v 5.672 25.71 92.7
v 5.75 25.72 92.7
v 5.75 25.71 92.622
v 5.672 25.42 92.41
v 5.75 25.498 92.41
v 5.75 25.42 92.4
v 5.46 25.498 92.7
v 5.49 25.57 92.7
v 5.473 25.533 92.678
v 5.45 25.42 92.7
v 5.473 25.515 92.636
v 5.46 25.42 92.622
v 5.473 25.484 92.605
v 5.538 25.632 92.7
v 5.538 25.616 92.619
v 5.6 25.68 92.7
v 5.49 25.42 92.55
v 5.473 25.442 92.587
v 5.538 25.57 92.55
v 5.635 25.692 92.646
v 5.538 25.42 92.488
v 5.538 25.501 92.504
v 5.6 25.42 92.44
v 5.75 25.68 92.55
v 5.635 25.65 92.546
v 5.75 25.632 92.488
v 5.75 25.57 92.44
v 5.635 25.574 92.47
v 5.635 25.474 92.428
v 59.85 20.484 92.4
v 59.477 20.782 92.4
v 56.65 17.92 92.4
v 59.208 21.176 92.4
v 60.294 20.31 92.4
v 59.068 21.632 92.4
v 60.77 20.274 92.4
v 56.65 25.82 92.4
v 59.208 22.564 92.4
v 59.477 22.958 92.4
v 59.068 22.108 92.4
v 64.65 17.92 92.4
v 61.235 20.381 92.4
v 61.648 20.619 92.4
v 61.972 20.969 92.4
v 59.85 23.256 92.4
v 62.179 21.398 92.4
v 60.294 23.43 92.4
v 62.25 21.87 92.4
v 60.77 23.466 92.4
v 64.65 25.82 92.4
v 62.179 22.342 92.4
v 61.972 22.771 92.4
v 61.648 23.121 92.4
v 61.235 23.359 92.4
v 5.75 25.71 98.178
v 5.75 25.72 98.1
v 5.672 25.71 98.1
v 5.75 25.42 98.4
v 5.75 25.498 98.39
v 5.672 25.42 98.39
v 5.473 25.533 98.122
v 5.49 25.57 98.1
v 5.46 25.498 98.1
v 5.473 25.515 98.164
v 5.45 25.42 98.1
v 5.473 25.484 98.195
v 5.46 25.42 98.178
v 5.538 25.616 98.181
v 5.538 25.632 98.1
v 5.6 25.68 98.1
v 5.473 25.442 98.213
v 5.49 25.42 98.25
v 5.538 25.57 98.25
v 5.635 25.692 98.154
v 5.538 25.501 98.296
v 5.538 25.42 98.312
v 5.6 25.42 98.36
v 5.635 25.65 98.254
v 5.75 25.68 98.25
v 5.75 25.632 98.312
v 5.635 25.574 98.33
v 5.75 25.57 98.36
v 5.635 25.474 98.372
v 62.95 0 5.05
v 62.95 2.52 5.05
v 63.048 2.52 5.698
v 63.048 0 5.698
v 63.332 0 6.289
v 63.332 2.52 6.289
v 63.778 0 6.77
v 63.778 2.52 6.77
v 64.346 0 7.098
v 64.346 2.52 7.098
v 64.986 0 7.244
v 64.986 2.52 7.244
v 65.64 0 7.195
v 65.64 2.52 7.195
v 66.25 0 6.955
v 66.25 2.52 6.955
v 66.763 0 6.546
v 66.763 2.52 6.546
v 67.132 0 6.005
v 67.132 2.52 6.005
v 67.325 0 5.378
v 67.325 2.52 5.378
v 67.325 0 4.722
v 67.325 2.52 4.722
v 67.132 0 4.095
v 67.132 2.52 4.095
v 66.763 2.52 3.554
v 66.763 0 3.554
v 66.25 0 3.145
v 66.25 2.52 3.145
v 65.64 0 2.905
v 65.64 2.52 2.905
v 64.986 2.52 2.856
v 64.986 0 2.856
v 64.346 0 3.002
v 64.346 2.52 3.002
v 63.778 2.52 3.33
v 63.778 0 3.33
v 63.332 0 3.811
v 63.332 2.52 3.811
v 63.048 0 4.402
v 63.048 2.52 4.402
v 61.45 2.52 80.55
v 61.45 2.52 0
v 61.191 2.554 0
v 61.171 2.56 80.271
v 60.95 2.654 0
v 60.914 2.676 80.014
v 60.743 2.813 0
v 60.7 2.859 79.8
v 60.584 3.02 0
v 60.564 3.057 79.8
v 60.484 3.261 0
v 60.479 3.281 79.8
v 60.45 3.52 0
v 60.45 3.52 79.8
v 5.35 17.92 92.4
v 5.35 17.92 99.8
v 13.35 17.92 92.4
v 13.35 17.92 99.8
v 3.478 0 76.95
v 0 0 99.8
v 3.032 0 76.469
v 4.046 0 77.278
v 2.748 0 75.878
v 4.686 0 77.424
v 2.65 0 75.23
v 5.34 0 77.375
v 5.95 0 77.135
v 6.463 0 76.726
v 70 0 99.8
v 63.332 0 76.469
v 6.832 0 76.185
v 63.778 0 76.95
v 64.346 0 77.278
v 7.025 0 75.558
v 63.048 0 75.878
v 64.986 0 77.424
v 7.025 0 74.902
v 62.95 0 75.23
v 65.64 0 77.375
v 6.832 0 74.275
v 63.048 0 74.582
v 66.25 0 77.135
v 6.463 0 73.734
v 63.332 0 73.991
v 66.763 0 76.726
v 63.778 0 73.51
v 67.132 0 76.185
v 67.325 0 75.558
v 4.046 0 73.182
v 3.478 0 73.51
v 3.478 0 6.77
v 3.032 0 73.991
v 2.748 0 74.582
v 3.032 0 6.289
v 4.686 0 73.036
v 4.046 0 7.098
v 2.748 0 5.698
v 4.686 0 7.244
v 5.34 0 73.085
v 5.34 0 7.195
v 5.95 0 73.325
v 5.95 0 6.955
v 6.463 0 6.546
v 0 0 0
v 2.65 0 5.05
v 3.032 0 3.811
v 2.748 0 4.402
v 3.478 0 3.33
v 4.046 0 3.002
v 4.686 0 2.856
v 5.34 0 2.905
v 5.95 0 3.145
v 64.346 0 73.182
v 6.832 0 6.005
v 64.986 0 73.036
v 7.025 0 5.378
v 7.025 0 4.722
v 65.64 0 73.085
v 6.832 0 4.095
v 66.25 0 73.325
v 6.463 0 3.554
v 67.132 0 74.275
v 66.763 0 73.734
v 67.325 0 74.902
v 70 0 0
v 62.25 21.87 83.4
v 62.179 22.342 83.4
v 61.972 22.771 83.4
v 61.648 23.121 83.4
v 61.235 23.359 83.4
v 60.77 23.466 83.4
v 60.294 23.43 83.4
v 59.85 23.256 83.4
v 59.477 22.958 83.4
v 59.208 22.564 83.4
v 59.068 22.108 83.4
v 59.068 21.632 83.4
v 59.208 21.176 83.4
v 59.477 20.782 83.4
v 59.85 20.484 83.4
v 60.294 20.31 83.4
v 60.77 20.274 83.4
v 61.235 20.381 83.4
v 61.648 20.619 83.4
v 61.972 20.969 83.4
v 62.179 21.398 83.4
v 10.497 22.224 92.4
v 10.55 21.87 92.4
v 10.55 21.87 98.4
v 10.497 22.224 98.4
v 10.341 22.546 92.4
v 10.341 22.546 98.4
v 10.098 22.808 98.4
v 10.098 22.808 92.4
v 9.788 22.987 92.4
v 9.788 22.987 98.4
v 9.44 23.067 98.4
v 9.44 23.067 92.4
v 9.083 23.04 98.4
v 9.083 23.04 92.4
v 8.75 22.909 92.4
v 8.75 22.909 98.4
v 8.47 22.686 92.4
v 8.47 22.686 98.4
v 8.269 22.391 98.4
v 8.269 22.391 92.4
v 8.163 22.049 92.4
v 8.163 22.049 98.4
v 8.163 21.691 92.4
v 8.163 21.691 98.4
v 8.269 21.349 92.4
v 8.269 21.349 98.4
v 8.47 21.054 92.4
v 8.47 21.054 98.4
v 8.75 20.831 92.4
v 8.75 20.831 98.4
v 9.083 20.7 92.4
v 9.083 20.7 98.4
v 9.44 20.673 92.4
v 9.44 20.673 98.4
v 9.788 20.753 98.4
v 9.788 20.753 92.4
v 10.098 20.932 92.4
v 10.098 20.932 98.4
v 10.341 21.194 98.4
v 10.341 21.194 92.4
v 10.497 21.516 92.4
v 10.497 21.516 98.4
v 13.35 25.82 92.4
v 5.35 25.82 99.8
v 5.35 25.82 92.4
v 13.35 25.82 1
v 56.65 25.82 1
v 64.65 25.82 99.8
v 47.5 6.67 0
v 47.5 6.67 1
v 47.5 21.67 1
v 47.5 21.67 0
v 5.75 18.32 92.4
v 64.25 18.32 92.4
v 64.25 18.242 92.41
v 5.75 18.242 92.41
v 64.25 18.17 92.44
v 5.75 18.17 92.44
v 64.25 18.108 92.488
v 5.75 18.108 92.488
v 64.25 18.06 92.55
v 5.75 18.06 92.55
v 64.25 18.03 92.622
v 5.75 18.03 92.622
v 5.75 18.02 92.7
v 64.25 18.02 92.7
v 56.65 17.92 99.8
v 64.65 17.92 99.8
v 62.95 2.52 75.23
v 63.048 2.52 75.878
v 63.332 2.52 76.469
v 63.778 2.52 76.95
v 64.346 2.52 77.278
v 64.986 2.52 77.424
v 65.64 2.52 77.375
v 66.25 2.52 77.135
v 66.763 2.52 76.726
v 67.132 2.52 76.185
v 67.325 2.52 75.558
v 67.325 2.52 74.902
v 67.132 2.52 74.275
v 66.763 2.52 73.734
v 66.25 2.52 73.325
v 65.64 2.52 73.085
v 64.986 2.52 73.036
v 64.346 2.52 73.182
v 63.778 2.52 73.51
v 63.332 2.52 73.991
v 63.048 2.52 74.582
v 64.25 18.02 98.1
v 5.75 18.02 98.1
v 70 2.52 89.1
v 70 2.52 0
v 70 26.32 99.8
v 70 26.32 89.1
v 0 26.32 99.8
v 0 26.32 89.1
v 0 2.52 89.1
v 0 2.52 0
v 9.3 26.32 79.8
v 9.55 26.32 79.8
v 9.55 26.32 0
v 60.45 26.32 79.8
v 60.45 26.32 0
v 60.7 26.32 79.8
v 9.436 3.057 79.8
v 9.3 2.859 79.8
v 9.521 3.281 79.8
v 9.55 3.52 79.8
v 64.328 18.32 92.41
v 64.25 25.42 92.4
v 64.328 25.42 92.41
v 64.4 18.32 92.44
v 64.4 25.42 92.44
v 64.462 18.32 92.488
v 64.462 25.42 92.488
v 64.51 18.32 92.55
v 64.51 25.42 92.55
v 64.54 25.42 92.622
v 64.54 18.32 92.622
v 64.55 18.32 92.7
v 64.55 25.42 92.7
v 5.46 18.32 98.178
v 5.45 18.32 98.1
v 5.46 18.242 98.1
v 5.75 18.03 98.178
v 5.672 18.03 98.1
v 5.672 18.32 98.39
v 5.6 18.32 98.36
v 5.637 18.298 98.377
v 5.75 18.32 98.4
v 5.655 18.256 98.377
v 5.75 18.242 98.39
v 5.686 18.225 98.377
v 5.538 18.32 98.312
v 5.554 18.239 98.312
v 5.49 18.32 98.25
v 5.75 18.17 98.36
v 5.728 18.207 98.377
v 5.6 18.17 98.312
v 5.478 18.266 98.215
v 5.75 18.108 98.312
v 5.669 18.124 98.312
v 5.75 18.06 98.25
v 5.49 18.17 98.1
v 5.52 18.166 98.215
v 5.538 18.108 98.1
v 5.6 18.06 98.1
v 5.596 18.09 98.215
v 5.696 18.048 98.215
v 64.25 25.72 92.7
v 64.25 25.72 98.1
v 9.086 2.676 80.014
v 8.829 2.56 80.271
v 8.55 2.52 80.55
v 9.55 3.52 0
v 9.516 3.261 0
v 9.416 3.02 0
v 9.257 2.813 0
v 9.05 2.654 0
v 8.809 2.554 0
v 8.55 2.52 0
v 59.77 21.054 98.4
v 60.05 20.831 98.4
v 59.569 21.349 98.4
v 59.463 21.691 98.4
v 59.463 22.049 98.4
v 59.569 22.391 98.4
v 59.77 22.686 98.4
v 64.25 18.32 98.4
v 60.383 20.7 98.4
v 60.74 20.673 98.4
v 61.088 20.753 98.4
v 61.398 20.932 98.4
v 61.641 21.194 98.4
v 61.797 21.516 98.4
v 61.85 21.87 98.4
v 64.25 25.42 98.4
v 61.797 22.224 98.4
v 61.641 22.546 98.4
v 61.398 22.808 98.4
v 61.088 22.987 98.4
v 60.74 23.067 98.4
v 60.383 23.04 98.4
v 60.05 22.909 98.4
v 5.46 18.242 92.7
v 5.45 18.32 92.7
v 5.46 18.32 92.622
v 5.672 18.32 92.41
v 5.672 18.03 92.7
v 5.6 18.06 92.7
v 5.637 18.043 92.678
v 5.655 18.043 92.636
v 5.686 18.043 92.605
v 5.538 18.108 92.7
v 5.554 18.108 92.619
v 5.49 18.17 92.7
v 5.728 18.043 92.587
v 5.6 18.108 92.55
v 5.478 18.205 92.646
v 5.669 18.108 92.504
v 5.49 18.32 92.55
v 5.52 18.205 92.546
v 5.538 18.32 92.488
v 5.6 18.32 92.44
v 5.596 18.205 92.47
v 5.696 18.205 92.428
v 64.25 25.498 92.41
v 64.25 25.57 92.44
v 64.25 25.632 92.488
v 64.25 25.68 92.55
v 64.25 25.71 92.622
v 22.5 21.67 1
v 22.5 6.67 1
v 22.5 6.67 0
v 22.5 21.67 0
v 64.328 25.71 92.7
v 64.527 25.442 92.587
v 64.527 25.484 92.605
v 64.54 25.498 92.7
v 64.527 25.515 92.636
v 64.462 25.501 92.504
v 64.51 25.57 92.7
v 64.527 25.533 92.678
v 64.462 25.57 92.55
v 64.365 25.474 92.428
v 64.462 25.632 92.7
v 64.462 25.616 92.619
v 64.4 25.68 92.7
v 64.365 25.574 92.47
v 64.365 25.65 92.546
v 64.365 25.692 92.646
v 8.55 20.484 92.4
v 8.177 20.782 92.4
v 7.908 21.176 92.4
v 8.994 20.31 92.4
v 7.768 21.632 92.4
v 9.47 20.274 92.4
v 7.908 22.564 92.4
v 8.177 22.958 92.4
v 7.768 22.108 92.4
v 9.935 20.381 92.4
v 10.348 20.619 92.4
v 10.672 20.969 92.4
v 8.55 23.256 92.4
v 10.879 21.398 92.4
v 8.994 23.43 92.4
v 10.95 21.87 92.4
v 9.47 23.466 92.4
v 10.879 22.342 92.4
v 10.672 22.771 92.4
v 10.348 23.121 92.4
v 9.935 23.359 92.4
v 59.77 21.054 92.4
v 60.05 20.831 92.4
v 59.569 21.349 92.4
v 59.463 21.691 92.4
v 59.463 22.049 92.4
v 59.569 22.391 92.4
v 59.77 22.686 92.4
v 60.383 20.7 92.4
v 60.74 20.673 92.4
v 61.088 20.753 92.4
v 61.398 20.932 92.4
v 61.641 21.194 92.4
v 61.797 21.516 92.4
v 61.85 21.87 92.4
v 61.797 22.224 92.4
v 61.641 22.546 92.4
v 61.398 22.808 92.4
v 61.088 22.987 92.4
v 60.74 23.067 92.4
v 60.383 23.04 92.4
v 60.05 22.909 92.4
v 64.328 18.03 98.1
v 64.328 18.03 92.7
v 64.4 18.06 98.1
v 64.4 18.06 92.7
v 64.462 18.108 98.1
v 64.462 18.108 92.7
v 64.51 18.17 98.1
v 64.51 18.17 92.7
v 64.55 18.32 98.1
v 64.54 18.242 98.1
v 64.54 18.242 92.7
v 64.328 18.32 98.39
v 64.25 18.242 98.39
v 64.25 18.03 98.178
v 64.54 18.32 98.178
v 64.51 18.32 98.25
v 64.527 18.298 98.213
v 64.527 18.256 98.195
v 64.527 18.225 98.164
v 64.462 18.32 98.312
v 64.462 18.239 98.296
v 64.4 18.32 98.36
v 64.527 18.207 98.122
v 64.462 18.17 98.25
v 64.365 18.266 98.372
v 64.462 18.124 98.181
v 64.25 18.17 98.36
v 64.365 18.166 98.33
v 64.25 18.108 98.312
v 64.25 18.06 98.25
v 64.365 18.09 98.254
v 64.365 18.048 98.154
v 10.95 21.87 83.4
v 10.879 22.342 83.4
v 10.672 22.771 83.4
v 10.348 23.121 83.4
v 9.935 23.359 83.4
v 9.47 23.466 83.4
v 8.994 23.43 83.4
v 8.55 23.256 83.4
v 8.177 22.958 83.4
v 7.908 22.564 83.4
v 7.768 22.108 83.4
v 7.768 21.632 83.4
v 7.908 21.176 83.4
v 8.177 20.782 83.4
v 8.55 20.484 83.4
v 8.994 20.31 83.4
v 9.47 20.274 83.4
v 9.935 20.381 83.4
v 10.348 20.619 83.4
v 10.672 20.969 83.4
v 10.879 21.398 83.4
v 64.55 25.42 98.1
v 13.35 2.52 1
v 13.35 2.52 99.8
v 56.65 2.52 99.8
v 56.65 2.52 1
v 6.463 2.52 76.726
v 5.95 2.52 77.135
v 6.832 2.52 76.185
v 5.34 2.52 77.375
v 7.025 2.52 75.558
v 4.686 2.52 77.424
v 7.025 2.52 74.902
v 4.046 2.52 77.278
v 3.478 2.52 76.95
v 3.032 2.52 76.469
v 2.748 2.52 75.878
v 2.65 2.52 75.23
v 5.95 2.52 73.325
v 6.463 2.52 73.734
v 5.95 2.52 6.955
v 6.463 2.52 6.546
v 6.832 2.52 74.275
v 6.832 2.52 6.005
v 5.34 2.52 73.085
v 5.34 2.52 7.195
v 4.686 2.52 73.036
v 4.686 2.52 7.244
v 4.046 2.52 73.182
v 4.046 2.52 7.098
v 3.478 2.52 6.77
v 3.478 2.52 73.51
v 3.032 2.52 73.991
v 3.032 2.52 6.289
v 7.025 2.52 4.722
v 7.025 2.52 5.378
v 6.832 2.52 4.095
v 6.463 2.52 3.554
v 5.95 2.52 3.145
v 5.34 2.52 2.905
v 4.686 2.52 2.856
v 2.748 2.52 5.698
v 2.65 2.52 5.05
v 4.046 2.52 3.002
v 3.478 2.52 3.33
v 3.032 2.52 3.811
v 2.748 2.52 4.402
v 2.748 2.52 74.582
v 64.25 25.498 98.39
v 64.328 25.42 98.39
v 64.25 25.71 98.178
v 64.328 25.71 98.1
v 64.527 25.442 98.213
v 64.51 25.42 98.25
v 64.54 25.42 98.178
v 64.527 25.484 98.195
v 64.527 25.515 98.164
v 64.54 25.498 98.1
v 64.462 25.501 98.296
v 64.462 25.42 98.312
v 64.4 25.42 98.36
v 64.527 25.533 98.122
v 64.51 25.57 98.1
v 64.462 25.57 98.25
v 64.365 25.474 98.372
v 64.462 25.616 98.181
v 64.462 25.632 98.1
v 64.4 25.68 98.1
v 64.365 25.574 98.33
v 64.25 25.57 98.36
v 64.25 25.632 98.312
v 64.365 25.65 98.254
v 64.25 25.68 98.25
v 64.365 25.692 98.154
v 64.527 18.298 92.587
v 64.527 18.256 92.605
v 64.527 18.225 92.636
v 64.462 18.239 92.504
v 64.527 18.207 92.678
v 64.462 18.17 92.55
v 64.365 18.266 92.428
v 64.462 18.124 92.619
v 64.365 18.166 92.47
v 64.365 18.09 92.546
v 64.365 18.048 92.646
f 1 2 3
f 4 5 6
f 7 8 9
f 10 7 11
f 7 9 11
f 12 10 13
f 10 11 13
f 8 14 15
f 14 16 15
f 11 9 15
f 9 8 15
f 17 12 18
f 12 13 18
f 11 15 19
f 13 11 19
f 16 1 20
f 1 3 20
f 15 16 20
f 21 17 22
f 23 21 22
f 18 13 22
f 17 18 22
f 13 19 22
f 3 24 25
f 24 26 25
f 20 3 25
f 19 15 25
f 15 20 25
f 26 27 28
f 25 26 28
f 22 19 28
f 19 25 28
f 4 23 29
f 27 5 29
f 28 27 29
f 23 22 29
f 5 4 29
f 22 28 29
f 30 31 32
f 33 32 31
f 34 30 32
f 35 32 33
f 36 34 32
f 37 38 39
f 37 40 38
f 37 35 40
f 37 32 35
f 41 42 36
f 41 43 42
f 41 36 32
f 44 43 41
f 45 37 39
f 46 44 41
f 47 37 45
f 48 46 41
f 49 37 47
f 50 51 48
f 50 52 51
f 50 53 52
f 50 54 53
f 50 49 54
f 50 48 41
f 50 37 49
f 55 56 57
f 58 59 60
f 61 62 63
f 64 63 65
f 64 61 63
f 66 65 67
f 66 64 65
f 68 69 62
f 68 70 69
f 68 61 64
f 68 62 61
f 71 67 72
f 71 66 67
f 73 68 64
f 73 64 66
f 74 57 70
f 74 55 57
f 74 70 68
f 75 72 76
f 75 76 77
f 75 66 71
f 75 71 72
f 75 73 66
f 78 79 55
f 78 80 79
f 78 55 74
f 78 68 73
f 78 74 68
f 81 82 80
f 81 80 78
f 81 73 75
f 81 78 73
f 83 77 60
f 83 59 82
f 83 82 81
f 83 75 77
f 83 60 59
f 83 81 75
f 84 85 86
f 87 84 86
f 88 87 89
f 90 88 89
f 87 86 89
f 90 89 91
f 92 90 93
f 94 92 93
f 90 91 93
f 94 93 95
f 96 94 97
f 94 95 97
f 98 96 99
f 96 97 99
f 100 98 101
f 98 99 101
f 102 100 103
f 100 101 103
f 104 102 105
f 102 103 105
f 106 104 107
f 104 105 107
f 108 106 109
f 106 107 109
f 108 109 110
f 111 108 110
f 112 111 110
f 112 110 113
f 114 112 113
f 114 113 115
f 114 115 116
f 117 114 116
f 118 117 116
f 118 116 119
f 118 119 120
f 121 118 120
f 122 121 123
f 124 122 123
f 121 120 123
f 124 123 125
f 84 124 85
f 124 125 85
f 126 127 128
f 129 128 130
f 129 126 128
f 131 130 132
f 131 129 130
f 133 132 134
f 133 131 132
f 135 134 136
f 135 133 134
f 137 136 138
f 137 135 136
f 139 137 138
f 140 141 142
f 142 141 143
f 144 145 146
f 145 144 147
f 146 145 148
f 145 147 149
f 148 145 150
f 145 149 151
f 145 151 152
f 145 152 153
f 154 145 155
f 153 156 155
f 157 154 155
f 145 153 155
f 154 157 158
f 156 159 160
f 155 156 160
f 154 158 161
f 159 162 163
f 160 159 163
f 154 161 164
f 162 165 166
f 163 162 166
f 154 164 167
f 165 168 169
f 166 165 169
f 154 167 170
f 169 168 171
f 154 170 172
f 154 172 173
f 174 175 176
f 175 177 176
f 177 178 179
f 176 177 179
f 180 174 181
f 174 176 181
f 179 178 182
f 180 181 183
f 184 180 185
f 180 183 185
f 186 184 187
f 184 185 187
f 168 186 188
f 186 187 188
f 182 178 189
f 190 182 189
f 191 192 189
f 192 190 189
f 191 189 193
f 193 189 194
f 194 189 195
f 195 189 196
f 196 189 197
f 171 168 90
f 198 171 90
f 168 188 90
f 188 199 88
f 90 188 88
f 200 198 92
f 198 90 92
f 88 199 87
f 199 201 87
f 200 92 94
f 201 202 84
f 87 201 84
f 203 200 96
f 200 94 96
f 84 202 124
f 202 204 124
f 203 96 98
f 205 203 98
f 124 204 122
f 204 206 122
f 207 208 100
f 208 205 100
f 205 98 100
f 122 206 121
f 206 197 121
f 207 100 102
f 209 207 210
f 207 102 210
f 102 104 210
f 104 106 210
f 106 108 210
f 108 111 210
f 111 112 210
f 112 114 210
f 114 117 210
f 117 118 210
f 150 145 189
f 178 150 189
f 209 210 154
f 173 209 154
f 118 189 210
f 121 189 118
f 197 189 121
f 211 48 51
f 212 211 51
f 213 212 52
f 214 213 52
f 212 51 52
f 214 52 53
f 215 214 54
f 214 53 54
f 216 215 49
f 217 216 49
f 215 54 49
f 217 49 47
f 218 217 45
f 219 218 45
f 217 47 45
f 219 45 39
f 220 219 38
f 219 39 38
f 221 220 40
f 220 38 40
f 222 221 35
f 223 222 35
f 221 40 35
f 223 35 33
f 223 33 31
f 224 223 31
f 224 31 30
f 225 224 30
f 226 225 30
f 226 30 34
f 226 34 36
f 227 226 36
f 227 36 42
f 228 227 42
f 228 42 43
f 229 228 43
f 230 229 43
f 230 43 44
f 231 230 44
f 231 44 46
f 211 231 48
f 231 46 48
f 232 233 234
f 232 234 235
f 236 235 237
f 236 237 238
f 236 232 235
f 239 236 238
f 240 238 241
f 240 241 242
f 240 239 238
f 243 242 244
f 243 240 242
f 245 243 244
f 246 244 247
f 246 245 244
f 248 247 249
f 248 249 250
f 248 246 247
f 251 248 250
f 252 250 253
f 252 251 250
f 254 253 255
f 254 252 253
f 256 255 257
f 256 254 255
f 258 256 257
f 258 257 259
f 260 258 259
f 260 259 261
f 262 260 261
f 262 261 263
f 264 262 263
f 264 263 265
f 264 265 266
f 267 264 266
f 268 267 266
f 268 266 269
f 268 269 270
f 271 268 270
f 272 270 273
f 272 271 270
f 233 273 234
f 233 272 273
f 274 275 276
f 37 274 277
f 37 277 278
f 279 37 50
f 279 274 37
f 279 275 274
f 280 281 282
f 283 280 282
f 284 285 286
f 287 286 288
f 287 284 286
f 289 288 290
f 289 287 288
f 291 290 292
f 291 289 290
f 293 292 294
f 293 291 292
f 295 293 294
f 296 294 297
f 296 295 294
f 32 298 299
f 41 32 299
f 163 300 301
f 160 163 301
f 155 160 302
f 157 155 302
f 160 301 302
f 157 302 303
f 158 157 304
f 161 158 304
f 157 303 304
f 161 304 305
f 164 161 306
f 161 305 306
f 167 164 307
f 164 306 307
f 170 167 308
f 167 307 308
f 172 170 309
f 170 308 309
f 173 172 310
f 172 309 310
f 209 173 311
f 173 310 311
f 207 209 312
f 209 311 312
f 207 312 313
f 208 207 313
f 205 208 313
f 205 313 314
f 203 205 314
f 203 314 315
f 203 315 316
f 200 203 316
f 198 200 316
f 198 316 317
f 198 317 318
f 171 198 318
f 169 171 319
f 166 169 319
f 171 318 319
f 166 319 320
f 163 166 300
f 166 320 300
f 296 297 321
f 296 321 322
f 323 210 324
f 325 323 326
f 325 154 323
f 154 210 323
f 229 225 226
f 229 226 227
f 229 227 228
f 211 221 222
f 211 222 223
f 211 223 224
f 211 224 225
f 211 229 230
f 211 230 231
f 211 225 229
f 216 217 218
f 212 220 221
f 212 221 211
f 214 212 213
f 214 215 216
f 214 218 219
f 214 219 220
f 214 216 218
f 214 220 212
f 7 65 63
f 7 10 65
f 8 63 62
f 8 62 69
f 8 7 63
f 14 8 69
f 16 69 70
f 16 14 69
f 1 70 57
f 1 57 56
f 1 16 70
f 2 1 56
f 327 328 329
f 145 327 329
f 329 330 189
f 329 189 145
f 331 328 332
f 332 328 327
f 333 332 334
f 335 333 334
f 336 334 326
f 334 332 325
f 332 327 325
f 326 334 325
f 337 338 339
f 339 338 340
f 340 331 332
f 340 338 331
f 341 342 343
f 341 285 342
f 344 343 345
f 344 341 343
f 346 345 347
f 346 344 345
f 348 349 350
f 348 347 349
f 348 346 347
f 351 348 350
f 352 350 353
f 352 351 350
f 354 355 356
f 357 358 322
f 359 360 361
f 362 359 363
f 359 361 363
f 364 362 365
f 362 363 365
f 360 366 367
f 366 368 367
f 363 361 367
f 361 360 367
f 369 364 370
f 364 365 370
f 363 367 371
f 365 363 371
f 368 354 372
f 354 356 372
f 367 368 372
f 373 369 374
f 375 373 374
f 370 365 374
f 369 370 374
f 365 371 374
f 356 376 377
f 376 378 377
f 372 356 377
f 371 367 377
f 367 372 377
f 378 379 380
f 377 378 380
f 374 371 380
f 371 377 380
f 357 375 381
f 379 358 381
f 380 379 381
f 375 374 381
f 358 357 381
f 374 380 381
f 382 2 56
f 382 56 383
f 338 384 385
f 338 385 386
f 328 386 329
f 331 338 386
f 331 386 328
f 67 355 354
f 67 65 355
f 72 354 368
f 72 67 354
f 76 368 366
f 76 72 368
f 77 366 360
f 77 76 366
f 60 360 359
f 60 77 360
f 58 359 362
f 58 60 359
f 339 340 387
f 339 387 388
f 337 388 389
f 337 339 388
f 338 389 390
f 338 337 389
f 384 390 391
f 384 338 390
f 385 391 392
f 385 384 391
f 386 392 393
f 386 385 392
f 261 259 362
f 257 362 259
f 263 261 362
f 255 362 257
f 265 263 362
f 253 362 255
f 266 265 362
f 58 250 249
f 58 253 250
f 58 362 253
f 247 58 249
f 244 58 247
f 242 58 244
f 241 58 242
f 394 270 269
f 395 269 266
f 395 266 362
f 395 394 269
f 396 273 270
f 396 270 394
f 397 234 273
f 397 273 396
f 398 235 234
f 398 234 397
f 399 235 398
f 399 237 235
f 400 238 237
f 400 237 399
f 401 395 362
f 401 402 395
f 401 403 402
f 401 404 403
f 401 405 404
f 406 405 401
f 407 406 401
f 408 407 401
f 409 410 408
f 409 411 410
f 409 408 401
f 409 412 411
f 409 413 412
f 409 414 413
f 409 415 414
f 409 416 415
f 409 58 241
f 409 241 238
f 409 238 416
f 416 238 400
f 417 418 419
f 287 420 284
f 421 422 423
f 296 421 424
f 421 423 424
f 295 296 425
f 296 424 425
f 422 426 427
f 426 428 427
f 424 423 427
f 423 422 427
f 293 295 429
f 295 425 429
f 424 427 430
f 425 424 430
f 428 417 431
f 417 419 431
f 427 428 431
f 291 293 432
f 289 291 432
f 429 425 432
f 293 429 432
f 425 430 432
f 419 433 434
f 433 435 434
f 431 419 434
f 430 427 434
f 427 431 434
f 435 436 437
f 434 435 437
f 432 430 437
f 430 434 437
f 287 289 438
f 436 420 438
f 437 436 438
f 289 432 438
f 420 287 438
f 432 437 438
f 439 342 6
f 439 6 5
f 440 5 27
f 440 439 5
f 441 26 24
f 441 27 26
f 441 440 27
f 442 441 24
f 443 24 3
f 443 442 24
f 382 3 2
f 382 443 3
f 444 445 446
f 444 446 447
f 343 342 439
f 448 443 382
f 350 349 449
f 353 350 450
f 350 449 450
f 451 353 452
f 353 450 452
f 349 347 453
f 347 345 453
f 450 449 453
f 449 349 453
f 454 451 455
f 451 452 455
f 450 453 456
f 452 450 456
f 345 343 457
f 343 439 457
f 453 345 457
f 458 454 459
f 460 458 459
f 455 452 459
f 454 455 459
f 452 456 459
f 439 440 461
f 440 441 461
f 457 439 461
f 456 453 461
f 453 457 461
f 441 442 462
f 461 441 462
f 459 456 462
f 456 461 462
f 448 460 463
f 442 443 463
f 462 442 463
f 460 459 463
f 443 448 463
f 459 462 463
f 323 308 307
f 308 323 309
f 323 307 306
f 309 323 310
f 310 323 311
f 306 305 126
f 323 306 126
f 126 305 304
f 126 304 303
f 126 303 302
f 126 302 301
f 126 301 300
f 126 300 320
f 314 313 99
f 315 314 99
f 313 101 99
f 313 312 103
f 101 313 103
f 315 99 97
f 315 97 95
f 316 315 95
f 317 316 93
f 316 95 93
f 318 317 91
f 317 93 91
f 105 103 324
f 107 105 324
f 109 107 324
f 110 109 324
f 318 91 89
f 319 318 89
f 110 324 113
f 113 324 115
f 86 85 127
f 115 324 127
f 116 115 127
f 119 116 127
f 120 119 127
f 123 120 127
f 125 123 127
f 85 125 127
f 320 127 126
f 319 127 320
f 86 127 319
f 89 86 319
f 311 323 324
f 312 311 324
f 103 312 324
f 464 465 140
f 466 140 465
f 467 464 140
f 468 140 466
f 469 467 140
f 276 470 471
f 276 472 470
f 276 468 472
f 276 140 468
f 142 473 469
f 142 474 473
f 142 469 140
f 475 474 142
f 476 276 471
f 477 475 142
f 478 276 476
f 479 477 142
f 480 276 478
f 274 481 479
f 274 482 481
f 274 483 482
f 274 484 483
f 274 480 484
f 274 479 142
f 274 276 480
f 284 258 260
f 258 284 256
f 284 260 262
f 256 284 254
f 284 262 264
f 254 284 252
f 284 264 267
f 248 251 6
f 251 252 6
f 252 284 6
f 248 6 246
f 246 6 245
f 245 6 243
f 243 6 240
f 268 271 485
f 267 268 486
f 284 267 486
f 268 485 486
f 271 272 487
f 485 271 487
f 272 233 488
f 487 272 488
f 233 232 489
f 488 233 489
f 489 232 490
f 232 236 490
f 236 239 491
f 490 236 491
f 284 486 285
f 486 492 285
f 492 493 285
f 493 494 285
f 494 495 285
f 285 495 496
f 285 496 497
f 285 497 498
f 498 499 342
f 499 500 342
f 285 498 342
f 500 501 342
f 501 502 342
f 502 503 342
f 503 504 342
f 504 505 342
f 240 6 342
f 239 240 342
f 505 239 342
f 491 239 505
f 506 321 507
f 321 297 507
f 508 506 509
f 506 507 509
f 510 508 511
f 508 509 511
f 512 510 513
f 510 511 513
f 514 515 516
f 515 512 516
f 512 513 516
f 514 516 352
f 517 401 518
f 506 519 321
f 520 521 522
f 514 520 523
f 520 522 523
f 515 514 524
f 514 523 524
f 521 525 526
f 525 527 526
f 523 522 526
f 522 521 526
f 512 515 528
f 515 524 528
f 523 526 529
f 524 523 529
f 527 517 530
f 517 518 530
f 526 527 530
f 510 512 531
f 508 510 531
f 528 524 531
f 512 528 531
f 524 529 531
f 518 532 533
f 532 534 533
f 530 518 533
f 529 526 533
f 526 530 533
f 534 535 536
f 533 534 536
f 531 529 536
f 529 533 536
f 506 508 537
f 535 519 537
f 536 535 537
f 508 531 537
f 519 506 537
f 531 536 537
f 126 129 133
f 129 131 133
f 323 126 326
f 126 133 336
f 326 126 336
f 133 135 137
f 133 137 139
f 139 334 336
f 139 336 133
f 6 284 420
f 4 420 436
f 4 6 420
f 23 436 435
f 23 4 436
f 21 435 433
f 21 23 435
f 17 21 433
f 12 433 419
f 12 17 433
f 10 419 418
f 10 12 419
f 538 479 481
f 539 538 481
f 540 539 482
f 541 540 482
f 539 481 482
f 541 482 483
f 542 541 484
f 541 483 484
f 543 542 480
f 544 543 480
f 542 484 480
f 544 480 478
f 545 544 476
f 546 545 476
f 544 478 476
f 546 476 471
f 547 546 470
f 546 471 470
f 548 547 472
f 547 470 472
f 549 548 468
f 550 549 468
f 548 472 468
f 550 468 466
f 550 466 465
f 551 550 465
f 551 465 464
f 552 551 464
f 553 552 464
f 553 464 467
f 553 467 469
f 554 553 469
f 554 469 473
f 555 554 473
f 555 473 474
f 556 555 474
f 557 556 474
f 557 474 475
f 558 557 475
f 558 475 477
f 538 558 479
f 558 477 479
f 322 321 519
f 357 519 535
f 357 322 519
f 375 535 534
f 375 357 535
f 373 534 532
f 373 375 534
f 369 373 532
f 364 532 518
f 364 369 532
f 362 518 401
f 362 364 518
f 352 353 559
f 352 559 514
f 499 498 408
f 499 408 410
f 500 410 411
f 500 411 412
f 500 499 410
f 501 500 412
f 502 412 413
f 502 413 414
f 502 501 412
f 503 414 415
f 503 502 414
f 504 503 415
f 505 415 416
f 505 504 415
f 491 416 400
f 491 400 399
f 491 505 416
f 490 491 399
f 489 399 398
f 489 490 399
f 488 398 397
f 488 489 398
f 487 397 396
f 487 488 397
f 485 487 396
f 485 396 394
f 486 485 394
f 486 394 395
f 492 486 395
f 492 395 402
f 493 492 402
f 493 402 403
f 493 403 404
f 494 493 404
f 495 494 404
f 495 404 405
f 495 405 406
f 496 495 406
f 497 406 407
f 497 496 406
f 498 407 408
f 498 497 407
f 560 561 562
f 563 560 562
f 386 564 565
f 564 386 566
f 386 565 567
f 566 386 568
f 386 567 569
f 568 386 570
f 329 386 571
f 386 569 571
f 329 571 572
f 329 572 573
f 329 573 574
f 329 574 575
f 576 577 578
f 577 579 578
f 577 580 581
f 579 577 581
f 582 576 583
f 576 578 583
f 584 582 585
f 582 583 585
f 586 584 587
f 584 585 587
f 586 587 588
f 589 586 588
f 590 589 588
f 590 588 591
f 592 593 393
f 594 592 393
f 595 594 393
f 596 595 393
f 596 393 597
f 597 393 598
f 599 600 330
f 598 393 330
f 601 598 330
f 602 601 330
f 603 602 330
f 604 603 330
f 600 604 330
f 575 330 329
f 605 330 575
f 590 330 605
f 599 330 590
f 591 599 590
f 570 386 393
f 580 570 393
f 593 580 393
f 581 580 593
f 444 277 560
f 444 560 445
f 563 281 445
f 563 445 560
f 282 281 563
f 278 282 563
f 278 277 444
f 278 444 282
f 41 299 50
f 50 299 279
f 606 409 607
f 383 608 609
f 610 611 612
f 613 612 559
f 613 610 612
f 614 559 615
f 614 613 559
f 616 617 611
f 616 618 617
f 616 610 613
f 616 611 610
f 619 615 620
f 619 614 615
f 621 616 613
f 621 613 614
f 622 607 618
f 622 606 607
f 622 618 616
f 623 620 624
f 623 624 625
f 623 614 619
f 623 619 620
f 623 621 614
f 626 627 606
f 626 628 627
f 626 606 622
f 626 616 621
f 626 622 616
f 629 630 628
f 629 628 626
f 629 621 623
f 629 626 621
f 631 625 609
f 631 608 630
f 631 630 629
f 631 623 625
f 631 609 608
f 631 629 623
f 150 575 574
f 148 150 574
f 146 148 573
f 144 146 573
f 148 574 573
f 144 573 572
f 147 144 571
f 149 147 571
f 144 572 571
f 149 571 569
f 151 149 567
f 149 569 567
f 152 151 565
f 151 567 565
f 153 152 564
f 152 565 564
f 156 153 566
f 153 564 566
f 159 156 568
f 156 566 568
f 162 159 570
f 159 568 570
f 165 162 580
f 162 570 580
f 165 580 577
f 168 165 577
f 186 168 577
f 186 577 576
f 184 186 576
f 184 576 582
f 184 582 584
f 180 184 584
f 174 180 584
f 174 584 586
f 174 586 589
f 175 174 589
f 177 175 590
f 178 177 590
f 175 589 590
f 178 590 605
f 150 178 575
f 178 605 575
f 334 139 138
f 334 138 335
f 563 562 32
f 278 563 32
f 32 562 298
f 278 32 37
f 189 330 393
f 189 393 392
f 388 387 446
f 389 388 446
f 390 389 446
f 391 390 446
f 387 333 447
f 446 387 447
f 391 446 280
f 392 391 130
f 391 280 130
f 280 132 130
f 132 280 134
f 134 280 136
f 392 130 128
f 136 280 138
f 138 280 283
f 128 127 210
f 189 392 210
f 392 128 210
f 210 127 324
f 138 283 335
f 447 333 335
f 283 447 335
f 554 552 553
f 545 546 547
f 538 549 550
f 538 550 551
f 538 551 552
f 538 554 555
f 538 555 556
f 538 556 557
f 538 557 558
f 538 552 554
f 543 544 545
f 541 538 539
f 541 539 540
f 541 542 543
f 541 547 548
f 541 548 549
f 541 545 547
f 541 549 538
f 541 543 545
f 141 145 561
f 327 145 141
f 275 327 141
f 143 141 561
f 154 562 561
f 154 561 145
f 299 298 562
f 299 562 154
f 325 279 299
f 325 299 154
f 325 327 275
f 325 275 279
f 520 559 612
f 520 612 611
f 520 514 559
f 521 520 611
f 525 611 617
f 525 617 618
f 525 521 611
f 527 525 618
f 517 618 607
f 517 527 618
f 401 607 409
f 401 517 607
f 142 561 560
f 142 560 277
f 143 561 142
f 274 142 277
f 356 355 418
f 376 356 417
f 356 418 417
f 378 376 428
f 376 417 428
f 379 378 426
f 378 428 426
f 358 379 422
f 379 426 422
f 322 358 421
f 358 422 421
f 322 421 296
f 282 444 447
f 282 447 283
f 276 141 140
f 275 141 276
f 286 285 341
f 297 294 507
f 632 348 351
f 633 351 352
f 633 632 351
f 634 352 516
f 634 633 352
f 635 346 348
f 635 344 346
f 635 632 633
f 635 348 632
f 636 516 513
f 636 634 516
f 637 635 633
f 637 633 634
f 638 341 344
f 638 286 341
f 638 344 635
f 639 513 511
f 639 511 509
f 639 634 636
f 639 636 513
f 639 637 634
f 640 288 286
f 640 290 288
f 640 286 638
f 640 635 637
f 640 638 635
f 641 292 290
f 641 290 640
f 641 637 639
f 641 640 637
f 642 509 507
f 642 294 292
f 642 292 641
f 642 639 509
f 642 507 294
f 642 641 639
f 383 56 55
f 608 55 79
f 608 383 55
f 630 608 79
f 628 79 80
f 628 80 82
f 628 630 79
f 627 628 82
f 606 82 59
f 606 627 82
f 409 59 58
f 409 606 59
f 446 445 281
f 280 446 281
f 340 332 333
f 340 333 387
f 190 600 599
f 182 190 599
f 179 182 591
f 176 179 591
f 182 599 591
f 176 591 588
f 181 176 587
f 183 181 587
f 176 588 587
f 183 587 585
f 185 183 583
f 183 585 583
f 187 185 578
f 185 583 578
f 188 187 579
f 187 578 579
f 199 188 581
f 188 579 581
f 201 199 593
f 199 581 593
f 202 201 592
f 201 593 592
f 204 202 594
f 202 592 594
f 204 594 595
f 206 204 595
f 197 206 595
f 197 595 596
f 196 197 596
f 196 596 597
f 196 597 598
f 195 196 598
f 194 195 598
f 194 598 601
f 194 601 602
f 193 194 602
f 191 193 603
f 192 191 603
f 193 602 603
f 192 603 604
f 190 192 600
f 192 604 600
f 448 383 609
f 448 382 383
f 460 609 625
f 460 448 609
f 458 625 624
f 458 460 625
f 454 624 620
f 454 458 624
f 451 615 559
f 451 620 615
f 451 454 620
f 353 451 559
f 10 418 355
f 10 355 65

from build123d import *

# Parameters (mm, degrees)
PAD_DEPTH         = 99.8
SKETCH001_W       = 43.3
SKETCH001_H       = 23.3
POCKET_DEPTH      = 98.8
SKETCH002_W       = 9.55
SKETCH002_H       = 23.8
PAD001_DEPTH      = 20
CHAMFER_SIZE      = 9.3
SKETCH003_W       = 8
SKETCH003_H       = 7.9
POCKET001_DEPTH   = 7.4
SKETCH004_W       = 25
SKETCH004_H       = 15
POCKET002_DEPTH   = 1
SKETCH005_R       = 1.6
POCKET003_DEPTH   = 9
SKETCH006_R       = 2.2
POCKET004_DEPTH   = 2.52
FILLET_R          = 1
SKETCH007_W       = 59.3
SKETCH007_H       = 7.9
PAD002_DEPTH      = 6
PAD002_FACE4_W    = 59.3
PAD002_FACE4_H    = 6
POCKET005_DEPTH   = 0.1
POCKET005_FACE3_W = 59.3
POCKET005_FACE3_H = 6
POCKET006_DEPTH   = 0.1
POCKET006_FACE6_W = 7.7
POCKET006_FACE6_H = 6
POCKET007_DEPTH   = 0.1
POCKET007_FACE1_W = 7.7
POCKET007_FACE1_H = 6
POCKET008_DEPTH   = 0.1
SKETCH008_R       = 1.2
POCKET009_DEPTH   = 6
FILLET001_R       = 0.3


with BuildPart() as body:
    # Sketch → Pad (new body)
    with BuildSketch(Plane.XY):
        Polygon((0, 0), (70, 0), (70, 2.52), (60.45, 2.52), (60.45, 26.32), (9.55, 26.32), (9.55, 2.52), (0, 2.52), align=None)
    extrude(amount=PAD_DEPTH)

    # Sketch001 (on Face10 of Pad) → Pocket (cut)
    with BuildSketch(Plane.XY.offset(99.8)):
        with Locations((35, 14.17)):
            Rectangle(SKETCH001_W, SKETCH001_H)
    extrude(amount=-POCKET_DEPTH, mode=Mode.SUBTRACT)

    # Sketch002 (on Face5 of Pocket) → Pad001 (join)
    with BuildSketch(Plane.XY.offset(99.8)):
        with Locations((65.225, 14.42)):
            Rectangle(SKETCH002_W, SKETCH002_H)
        with Locations((4.775, 14.42)):
            Rectangle(SKETCH002_W, SKETCH002_H)
    extrude(amount=-PAD001_DEPTH)

    # Chamfer
    chamfer_edges = [body.edges().sort_by_distance(p)[0] for p in [
        (0, 14.42, 79.8),
        (70, 14.42, 79.8),
    ]]
    chamfer(chamfer_edges, length=CHAMFER_SIZE)

    # Sketch003 (on Face8 of Chamfer) → Pocket001 (cut)
    with BuildSketch(Plane.XY.offset(99.8)):
        with Locations((9.35, 21.87)):
            Rectangle(SKETCH003_W, SKETCH003_H)
        with Locations((60.65, 21.87)):
            Rectangle(SKETCH003_W, SKETCH003_H)
    extrude(amount=-POCKET001_DEPTH, mode=Mode.SUBTRACT)

    # Sketch004 (on Face23 of Pocket001) → Pocket002 (cut)
    with BuildSketch(Plane.XY.offset(1)):
        with Locations((35, 14.17)):
            Rectangle(SKETCH004_W, SKETCH004_H)
    extrude(amount=-POCKET002_DEPTH, mode=Mode.SUBTRACT)

    # Sketch005 (on Face28 of Pocket002) → Pocket003 (cut)
    with BuildSketch(Plane.XY.offset(92.4)):
        with Locations((9.35, 21.87)):
            Circle(SKETCH005_R)
        with Locations((60.65, 21.87)):
            Circle(SKETCH005_R)
    extrude(amount=-POCKET003_DEPTH, mode=Mode.SUBTRACT)

    # Sketch006 (on Face1 of Pocket003) → Pocket004 (cut)
    with BuildSketch(Plane(origin=(0, 2.52, 0), x_dir=(-1, 0, 0), z_dir=(0, 1, 0))):
        with Locations((-65.15, 75.23)):
            Circle(SKETCH006_R)
        with Locations((-65.15, 5.05)):
            Circle(SKETCH006_R)
        with Locations((-4.85, 75.23)):
            Circle(SKETCH006_R)
        with Locations((-4.85, 5.05)):
            Circle(SKETCH006_R)
    extrude(amount=-POCKET004_DEPTH, mode=Mode.SUBTRACT)

    # Fillet
    fillet_edges = [body.edges().sort_by_distance(p)[0] for p in [
        (9.55, 2.52, 39.9),
        (60.45, 2.52, 39.9),
    ]]
    fillet(fillet_edges, radius=FILLET_R)


with BuildPart() as bar:
    # Sketch007 (on Face1 of Binder) → Pad002 (new body)
    with BuildSketch(Plane.XY.offset(92.4)):
        with Locations((35, 21.87)):
            Rectangle(SKETCH007_W, SKETCH007_H)
    extrude(amount=PAD002_DEPTH)

    # Pad002 Face4 → Pocket005 (cut)
    with BuildSketch(Plane(origin=(35, 25.82, 95.4), x_dir=(1, 0, 0), z_dir=(0, 1, 0))):
        Rectangle(PAD002_FACE4_W, PAD002_FACE4_H)
    extrude(amount=-POCKET005_DEPTH, mode=Mode.SUBTRACT)

    # Pocket005 Face3 → Pocket006 (cut)
    with BuildSketch(Plane(origin=(35, 17.92, 95.4), x_dir=(-1, 0, 0), z_dir=(0, -1, 0))):
        Rectangle(POCKET005_FACE3_W, POCKET005_FACE3_H)
    extrude(amount=-POCKET006_DEPTH, mode=Mode.SUBTRACT)

    # Pocket006 Face6 → Pocket007 (cut)
    with BuildSketch(Plane(origin=(64.65, 21.87, 95.4), x_dir=(0, -1, 0), z_dir=(1, 0, 0))):
        Rectangle(POCKET006_FACE6_W, POCKET006_FACE6_H)
    extrude(amount=-POCKET007_DEPTH, mode=Mode.SUBTRACT)

    # Pocket007 Face1 → Pocket008 (cut)
    with BuildSketch(Plane(origin=(5.35, 21.87, 95.4), x_dir=(0, 1, 0), z_dir=(-1, 0, 0))):
        Rectangle(POCKET007_FACE1_W, POCKET007_FACE1_H)
    extrude(amount=-POCKET008_DEPTH, mode=Mode.SUBTRACT)

    # Sketch008 (on Face1 of Binder) → Pocket009 (cut)
    with BuildSketch(Plane.XY.offset(92.4)):
        with Locations((9.35, 21.87)):
            Circle(SKETCH008_R)
        with Locations((60.65, 21.87)):
            Circle(SKETCH008_R)
    extrude(amount=POCKET009_DEPTH, mode=Mode.SUBTRACT)

    # Fillet001
    fillet001_edges = [bar.edges().sort_by_distance(p)[0] for p in [
        (35, 25.72, 92.4),
        (35, 25.72, 98.4),
        (5.45, 25.72, 95.4),
        (5.45, 21.87, 92.4),
        (5.45, 18.02, 95.4),
        (5.45, 21.87, 98.4),
        (35, 18.02, 92.4),
        (64.55, 21.87, 92.4),
        (35, 18.02, 98.4),
        (64.55, 21.87, 98.4),
        (64.55, 25.72, 95.4),
        (64.55, 18.02, 95.4),
    ]]
    fillet(fillet001_edges, radius=FILLET001_R)


solid = Compound([body.part, bar.part])
